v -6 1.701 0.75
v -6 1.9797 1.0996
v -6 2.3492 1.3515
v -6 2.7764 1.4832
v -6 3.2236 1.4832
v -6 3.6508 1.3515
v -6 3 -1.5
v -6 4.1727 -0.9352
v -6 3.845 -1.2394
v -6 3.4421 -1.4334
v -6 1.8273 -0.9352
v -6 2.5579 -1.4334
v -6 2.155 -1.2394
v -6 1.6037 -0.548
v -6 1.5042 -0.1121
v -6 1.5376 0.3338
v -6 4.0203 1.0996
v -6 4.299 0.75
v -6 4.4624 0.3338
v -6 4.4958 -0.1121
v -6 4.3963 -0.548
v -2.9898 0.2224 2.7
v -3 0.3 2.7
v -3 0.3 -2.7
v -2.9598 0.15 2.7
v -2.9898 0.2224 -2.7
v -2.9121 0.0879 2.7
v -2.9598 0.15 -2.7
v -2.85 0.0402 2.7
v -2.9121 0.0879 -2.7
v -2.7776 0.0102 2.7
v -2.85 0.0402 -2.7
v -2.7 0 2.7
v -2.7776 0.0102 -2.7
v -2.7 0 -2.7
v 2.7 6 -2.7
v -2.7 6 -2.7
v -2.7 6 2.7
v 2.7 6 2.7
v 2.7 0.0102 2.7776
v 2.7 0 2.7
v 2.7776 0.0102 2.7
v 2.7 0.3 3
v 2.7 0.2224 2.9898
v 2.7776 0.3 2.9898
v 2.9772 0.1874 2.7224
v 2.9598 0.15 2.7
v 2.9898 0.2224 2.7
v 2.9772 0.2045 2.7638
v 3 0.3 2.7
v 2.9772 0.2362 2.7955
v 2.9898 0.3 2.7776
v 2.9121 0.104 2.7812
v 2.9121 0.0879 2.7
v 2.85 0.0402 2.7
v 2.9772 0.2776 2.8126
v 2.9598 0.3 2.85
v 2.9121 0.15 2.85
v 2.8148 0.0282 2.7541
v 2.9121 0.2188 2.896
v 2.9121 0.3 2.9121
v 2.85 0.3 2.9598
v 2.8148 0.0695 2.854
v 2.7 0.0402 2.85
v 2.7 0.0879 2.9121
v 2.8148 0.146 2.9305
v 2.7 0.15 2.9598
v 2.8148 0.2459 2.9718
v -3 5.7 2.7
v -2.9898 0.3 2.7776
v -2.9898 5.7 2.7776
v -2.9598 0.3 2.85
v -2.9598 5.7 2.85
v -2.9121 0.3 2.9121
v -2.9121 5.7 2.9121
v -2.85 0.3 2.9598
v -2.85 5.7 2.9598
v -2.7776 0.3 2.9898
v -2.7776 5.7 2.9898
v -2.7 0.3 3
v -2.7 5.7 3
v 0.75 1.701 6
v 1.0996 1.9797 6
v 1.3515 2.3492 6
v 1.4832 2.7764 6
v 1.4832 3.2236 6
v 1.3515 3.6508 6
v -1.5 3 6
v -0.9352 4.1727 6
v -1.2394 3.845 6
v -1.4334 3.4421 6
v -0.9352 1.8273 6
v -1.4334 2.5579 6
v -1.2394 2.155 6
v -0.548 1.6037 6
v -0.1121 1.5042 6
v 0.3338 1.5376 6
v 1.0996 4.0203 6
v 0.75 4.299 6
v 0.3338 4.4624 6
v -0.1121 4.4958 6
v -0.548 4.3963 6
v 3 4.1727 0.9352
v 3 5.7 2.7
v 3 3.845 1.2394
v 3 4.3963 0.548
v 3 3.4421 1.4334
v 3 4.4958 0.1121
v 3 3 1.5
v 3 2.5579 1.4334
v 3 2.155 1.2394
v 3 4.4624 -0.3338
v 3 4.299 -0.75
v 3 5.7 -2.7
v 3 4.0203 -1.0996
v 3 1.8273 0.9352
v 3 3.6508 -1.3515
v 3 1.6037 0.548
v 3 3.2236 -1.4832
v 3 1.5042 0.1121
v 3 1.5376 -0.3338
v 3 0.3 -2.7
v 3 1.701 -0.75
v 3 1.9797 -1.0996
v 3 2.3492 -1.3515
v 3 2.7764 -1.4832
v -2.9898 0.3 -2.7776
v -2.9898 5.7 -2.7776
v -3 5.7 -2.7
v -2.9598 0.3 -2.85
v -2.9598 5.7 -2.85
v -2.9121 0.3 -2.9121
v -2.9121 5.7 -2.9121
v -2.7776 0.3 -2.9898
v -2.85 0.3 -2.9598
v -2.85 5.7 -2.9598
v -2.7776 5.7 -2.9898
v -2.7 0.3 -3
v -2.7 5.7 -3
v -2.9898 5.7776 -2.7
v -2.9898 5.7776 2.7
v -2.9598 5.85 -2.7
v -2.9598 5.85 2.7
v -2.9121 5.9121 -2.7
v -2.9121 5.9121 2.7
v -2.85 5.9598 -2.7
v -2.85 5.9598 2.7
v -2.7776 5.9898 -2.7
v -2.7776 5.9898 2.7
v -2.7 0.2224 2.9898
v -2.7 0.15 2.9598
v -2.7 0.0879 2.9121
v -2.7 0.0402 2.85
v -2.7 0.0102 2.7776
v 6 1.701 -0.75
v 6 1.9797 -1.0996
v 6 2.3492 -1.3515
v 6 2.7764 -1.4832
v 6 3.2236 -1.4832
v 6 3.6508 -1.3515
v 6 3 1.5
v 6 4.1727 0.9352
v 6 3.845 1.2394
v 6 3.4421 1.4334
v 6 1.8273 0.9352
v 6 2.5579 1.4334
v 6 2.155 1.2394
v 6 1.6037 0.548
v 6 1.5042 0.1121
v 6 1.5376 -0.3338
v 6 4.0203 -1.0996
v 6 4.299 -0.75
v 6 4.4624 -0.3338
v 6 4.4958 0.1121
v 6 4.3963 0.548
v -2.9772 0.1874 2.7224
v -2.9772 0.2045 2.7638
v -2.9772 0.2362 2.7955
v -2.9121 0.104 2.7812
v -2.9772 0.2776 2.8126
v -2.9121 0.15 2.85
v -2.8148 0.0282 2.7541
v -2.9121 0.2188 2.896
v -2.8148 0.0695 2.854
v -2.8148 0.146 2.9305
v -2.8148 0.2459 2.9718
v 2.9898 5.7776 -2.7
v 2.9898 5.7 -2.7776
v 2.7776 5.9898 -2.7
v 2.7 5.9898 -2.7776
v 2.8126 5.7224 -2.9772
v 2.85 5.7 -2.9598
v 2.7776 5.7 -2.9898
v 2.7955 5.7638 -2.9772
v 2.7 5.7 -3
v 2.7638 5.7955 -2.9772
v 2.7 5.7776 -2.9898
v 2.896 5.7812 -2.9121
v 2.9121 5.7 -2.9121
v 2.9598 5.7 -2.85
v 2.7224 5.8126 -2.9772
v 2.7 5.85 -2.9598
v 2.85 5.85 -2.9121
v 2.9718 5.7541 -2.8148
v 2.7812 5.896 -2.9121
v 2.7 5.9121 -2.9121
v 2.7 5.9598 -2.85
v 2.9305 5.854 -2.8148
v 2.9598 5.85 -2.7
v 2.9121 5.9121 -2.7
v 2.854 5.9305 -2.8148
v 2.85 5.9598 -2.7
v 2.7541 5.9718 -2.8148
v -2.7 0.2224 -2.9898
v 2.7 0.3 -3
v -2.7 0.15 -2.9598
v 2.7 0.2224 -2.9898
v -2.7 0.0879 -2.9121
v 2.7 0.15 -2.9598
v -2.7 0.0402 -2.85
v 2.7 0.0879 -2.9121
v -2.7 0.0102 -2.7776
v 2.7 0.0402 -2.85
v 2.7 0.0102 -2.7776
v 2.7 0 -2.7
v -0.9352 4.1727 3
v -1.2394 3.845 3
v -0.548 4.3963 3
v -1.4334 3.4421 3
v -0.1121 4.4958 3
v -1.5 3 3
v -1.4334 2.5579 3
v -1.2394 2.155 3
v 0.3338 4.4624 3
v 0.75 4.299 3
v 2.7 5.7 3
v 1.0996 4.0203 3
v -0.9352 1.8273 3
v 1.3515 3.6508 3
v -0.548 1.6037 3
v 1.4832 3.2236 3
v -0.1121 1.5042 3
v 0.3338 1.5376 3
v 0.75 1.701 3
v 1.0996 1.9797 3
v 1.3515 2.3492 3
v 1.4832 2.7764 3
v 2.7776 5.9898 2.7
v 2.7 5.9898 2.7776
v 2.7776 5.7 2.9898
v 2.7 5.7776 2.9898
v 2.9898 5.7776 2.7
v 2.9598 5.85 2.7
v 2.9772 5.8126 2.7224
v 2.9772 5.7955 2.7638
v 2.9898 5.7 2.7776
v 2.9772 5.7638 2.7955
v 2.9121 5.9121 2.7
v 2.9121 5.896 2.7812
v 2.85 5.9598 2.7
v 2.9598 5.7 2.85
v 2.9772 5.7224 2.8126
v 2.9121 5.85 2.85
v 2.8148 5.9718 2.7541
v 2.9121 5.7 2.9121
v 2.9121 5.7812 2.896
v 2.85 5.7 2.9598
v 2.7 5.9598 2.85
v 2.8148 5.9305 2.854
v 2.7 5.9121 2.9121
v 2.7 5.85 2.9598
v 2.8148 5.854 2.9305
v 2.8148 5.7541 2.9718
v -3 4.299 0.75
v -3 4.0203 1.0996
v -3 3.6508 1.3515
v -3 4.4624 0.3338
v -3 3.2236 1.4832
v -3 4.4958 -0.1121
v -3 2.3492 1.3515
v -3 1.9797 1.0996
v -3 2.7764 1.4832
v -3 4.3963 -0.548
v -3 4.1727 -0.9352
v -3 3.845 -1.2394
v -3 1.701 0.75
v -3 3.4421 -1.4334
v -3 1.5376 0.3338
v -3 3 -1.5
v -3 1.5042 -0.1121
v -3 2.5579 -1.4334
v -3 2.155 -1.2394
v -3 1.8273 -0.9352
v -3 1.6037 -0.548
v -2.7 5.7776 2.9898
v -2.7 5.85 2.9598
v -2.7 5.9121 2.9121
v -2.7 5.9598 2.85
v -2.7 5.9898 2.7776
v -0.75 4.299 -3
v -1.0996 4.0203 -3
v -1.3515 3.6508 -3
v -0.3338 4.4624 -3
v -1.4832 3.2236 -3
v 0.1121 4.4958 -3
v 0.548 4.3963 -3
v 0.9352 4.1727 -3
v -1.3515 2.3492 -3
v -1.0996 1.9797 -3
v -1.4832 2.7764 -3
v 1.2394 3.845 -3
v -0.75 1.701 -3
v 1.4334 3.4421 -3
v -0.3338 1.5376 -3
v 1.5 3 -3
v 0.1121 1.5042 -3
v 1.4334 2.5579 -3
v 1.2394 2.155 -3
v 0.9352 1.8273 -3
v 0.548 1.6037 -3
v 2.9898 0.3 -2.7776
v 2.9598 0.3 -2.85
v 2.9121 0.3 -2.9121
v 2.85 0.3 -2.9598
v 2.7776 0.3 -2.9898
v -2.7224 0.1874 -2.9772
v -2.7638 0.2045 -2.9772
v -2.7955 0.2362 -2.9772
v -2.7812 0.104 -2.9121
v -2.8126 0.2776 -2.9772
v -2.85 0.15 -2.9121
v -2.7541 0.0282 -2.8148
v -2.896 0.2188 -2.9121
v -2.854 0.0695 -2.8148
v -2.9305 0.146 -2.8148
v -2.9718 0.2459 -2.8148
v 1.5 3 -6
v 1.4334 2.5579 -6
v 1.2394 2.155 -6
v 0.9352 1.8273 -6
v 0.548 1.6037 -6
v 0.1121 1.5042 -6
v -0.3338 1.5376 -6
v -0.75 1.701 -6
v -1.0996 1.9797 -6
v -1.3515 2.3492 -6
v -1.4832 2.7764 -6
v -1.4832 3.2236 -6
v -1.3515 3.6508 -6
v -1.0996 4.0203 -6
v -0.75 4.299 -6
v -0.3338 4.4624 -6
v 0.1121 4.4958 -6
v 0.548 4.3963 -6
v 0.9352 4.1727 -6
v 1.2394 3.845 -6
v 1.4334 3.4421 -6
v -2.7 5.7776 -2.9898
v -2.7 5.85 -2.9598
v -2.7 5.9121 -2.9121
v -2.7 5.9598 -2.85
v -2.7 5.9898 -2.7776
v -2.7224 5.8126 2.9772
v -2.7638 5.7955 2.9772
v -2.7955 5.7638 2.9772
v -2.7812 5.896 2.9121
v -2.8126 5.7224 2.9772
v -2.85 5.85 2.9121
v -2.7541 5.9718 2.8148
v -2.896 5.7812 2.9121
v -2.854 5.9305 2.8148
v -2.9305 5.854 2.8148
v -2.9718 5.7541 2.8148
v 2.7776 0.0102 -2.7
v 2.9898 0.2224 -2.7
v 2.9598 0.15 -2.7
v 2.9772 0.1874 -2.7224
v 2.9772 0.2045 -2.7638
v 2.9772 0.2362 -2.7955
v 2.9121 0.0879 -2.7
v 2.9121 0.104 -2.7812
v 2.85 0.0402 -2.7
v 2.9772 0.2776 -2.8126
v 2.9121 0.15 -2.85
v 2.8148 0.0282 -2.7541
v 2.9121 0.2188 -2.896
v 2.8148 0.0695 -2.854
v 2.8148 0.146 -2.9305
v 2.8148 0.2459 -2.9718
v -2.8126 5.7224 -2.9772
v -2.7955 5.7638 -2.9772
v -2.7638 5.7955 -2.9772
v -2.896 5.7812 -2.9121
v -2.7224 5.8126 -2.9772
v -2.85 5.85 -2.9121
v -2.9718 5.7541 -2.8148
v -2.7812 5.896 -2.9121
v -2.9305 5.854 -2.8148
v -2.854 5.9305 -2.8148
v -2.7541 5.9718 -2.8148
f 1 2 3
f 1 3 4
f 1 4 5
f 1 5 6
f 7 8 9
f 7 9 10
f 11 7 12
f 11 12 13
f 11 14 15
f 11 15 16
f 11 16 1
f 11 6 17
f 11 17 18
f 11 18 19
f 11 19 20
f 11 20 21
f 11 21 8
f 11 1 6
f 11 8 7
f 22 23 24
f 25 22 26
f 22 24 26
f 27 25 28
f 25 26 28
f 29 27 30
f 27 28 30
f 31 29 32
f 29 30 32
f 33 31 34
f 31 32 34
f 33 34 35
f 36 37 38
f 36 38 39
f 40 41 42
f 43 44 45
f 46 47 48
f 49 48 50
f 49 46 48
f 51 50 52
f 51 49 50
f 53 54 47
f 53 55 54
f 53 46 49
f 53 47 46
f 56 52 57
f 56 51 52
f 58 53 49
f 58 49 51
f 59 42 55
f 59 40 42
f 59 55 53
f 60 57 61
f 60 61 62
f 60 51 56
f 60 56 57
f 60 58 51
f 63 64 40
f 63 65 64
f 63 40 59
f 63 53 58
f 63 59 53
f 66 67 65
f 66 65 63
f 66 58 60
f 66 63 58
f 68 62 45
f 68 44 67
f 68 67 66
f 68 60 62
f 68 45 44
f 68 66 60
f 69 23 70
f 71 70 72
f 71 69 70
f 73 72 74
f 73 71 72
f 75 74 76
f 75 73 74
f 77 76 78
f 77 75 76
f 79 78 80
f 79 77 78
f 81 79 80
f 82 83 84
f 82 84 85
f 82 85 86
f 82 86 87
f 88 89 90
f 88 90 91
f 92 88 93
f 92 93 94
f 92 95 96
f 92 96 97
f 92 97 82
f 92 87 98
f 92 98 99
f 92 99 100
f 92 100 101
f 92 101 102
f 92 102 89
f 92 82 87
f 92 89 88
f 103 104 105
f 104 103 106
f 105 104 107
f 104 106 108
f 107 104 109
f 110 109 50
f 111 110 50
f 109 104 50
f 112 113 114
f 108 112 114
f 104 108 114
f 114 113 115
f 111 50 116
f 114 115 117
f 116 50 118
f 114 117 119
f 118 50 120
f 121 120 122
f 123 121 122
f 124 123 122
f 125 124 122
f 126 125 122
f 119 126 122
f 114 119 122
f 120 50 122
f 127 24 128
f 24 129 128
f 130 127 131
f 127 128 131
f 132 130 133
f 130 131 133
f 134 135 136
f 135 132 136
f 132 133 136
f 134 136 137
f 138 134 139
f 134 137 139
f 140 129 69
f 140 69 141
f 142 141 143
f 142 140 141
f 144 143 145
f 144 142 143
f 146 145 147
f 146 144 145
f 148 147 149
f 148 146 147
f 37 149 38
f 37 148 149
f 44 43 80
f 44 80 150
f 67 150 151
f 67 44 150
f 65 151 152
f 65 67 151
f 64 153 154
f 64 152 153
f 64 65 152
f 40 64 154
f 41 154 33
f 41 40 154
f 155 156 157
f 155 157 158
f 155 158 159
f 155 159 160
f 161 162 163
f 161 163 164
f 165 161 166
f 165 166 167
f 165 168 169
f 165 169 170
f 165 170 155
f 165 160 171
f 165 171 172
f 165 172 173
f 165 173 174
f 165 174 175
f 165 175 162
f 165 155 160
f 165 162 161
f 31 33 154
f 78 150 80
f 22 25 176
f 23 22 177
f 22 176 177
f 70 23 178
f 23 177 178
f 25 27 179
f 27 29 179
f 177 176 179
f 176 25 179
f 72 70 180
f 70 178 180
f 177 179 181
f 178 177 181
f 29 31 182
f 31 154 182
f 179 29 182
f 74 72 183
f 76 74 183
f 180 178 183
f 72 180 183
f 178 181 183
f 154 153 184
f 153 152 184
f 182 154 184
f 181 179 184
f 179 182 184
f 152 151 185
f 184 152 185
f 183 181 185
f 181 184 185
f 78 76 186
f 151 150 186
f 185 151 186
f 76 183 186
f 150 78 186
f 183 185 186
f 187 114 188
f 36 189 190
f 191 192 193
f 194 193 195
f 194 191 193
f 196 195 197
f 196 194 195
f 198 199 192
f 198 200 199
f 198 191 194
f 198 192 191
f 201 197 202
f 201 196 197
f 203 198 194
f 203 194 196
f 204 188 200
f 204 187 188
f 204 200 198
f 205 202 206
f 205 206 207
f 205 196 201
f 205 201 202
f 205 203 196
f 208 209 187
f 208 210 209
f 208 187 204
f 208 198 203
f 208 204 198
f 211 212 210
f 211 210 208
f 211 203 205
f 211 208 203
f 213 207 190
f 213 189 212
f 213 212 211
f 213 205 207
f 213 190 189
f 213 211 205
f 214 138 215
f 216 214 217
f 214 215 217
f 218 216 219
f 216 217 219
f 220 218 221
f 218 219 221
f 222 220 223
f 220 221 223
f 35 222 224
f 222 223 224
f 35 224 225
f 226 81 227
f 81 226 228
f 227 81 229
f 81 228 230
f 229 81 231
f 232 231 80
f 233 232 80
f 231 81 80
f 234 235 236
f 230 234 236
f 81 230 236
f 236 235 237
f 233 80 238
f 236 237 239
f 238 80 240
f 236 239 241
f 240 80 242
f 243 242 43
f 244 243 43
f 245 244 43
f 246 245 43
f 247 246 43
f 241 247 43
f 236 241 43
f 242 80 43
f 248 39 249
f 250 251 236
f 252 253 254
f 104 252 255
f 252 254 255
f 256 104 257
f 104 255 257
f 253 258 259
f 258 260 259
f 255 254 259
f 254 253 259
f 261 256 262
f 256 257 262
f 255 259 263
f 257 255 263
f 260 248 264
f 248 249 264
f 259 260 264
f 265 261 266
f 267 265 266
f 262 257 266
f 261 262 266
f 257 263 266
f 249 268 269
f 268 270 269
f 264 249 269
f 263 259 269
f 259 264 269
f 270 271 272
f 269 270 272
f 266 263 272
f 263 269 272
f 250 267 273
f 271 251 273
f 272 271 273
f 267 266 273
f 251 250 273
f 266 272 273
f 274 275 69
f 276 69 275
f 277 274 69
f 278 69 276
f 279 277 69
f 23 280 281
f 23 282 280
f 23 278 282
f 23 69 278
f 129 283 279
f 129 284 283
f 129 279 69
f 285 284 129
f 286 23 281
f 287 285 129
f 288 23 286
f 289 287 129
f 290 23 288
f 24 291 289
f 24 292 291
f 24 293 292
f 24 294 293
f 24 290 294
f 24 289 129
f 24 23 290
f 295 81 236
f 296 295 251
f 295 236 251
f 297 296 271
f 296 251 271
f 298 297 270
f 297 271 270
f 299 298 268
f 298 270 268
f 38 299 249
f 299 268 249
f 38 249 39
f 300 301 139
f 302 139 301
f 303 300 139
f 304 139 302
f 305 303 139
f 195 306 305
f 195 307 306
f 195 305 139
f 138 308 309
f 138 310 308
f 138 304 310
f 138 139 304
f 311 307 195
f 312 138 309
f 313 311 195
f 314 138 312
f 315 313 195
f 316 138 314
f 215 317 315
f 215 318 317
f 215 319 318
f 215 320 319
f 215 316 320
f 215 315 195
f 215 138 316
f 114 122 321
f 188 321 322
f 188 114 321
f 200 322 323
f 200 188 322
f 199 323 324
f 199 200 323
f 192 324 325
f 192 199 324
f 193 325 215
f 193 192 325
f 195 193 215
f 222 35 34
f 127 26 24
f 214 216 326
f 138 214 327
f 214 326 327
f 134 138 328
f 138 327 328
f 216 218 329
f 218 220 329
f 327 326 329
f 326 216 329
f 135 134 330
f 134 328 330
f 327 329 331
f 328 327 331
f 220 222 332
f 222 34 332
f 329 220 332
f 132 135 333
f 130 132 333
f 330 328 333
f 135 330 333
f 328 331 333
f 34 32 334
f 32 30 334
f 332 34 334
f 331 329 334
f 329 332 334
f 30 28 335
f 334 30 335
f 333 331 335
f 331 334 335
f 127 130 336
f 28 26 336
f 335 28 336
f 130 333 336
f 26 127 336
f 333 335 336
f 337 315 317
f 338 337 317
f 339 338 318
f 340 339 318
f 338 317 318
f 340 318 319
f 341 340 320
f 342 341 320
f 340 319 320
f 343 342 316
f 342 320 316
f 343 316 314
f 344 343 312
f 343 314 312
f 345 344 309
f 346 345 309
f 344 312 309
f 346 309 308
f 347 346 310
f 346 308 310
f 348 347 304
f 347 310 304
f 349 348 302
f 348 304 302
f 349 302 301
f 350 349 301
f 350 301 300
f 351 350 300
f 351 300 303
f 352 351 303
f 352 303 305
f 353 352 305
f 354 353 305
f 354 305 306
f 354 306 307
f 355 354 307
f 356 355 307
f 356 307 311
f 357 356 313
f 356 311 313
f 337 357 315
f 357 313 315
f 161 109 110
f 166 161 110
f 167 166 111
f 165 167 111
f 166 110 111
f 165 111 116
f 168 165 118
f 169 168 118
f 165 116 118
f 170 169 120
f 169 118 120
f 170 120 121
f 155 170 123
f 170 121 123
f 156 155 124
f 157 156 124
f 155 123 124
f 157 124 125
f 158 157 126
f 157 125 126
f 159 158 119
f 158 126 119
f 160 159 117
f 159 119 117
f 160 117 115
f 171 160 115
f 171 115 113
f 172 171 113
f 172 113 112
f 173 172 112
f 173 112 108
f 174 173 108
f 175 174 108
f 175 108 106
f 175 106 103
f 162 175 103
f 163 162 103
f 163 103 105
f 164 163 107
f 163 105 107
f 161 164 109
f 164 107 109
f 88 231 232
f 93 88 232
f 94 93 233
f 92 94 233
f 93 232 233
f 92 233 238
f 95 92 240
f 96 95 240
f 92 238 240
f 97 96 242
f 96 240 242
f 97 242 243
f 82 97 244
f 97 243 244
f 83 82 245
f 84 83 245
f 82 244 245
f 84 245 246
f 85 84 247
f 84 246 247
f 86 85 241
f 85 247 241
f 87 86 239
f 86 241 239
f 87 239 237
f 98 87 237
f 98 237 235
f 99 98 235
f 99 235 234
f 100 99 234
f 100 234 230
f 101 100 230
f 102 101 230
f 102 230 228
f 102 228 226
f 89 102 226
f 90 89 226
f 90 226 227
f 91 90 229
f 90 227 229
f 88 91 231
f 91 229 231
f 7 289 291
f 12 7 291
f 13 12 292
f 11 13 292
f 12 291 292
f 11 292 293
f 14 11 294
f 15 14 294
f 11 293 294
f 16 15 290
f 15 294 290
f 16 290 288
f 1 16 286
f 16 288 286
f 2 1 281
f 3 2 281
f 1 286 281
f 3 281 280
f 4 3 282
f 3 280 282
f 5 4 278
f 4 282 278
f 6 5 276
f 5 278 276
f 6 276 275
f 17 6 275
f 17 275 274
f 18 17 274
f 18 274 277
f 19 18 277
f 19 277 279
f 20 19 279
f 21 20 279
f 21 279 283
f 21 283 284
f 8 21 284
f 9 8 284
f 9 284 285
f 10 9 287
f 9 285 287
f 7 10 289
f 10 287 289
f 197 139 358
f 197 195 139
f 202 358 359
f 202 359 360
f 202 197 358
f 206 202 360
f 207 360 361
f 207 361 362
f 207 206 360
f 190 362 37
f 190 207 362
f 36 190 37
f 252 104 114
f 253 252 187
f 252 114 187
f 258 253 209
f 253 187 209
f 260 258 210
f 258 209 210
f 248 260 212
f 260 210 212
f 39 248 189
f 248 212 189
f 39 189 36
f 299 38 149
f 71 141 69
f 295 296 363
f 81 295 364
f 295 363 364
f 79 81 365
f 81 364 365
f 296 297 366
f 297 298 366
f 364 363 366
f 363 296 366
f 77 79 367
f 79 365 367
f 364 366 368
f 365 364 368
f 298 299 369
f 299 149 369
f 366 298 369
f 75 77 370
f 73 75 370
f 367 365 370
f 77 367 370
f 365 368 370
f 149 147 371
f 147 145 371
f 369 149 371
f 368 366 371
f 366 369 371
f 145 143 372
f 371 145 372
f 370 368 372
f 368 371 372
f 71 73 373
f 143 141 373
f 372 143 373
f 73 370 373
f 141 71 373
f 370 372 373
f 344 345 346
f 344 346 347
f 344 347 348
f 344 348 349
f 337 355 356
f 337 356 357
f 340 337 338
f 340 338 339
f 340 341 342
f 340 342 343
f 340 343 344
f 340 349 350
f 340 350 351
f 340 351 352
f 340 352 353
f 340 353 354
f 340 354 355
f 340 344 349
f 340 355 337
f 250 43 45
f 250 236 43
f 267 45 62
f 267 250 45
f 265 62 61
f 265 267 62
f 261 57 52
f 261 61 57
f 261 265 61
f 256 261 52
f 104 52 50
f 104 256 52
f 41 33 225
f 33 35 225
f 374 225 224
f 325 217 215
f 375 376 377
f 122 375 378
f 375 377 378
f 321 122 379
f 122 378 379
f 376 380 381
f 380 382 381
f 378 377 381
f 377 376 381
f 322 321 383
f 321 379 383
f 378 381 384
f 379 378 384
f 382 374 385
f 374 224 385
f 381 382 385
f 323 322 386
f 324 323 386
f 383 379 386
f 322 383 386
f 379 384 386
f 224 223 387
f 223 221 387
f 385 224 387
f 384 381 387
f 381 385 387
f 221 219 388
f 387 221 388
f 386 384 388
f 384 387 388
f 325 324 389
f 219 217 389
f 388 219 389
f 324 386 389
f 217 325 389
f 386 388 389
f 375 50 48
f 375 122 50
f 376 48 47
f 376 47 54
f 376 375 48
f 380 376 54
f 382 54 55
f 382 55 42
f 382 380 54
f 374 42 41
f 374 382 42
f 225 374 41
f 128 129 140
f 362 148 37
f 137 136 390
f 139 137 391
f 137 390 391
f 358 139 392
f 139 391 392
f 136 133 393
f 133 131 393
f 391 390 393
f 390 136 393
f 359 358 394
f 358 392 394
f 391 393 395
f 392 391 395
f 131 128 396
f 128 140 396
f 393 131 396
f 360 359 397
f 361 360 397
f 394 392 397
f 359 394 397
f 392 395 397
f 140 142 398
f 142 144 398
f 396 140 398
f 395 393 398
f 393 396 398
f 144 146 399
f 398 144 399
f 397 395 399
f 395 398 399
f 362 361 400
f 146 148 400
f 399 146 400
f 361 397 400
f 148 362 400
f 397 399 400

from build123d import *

# Parameters (mm, degrees)
SKETCH1_W           = 6
SKETCH1_H           = 6
BOSS_EXTRUDE1_DEPTH = 6
FILLET1_R           = 0.3
SKETCH2_R           = 1.5
BOSS_EXTRUDE2_DEPTH = 3
CIRPATTERN1_COUNT   = 4


with BuildPart() as part:
    # Sketch1 → Boss-Extrude1 (new body)
    with BuildSketch(Plane(origin=(0, 0, 0), x_dir=(1, 0, 0), z_dir=(0, 1, 0))):
        Rectangle(SKETCH1_W, SKETCH1_H)
    extrude(amount=BOSS_EXTRUDE1_DEPTH)

    # Fillet1
    fillet1_edges = [part.edges().sort_by_distance(p)[0] for p in [
        (-3, 0, 0),
        (-3, 3, -3),
        (0, 0, -3),
        (3, 3, -3),
        (3, 0, 0),
        (-3, 3, 3),
        (3, 3, 3),
        (0, 0, 3),
        (0, 6, 3),
        (-3, 6, 0),
        (0, 6, -3),
        (3, 6, 0),
    ]]
    fillet(fillet1_edges, radius=FILLET1_R)

    # Sketch2 → Boss-Extrude2 (add)
    with BuildSketch(Plane(origin=(0, 0, -3), x_dir=(-1, 0, 0), z_dir=(0, 0, -1))):
        with Locations((0, 3)):
            Circle(SKETCH2_R)
    boss_extrude2 = extrude(amount=BOSS_EXTRUDE2_DEPTH)

    # CirPattern1: Boss-Extrude2 ×4 about axis
    cirpattern1_axis = Axis((0, 0.03, 0), (0, 1, 0))
    for i in range(1, CIRPATTERN1_COUNT):
        add(boss_extrude2.rotate(cirpattern1_axis, i * 360 / CIRPATTERN1_COUNT))


solid = part.part
